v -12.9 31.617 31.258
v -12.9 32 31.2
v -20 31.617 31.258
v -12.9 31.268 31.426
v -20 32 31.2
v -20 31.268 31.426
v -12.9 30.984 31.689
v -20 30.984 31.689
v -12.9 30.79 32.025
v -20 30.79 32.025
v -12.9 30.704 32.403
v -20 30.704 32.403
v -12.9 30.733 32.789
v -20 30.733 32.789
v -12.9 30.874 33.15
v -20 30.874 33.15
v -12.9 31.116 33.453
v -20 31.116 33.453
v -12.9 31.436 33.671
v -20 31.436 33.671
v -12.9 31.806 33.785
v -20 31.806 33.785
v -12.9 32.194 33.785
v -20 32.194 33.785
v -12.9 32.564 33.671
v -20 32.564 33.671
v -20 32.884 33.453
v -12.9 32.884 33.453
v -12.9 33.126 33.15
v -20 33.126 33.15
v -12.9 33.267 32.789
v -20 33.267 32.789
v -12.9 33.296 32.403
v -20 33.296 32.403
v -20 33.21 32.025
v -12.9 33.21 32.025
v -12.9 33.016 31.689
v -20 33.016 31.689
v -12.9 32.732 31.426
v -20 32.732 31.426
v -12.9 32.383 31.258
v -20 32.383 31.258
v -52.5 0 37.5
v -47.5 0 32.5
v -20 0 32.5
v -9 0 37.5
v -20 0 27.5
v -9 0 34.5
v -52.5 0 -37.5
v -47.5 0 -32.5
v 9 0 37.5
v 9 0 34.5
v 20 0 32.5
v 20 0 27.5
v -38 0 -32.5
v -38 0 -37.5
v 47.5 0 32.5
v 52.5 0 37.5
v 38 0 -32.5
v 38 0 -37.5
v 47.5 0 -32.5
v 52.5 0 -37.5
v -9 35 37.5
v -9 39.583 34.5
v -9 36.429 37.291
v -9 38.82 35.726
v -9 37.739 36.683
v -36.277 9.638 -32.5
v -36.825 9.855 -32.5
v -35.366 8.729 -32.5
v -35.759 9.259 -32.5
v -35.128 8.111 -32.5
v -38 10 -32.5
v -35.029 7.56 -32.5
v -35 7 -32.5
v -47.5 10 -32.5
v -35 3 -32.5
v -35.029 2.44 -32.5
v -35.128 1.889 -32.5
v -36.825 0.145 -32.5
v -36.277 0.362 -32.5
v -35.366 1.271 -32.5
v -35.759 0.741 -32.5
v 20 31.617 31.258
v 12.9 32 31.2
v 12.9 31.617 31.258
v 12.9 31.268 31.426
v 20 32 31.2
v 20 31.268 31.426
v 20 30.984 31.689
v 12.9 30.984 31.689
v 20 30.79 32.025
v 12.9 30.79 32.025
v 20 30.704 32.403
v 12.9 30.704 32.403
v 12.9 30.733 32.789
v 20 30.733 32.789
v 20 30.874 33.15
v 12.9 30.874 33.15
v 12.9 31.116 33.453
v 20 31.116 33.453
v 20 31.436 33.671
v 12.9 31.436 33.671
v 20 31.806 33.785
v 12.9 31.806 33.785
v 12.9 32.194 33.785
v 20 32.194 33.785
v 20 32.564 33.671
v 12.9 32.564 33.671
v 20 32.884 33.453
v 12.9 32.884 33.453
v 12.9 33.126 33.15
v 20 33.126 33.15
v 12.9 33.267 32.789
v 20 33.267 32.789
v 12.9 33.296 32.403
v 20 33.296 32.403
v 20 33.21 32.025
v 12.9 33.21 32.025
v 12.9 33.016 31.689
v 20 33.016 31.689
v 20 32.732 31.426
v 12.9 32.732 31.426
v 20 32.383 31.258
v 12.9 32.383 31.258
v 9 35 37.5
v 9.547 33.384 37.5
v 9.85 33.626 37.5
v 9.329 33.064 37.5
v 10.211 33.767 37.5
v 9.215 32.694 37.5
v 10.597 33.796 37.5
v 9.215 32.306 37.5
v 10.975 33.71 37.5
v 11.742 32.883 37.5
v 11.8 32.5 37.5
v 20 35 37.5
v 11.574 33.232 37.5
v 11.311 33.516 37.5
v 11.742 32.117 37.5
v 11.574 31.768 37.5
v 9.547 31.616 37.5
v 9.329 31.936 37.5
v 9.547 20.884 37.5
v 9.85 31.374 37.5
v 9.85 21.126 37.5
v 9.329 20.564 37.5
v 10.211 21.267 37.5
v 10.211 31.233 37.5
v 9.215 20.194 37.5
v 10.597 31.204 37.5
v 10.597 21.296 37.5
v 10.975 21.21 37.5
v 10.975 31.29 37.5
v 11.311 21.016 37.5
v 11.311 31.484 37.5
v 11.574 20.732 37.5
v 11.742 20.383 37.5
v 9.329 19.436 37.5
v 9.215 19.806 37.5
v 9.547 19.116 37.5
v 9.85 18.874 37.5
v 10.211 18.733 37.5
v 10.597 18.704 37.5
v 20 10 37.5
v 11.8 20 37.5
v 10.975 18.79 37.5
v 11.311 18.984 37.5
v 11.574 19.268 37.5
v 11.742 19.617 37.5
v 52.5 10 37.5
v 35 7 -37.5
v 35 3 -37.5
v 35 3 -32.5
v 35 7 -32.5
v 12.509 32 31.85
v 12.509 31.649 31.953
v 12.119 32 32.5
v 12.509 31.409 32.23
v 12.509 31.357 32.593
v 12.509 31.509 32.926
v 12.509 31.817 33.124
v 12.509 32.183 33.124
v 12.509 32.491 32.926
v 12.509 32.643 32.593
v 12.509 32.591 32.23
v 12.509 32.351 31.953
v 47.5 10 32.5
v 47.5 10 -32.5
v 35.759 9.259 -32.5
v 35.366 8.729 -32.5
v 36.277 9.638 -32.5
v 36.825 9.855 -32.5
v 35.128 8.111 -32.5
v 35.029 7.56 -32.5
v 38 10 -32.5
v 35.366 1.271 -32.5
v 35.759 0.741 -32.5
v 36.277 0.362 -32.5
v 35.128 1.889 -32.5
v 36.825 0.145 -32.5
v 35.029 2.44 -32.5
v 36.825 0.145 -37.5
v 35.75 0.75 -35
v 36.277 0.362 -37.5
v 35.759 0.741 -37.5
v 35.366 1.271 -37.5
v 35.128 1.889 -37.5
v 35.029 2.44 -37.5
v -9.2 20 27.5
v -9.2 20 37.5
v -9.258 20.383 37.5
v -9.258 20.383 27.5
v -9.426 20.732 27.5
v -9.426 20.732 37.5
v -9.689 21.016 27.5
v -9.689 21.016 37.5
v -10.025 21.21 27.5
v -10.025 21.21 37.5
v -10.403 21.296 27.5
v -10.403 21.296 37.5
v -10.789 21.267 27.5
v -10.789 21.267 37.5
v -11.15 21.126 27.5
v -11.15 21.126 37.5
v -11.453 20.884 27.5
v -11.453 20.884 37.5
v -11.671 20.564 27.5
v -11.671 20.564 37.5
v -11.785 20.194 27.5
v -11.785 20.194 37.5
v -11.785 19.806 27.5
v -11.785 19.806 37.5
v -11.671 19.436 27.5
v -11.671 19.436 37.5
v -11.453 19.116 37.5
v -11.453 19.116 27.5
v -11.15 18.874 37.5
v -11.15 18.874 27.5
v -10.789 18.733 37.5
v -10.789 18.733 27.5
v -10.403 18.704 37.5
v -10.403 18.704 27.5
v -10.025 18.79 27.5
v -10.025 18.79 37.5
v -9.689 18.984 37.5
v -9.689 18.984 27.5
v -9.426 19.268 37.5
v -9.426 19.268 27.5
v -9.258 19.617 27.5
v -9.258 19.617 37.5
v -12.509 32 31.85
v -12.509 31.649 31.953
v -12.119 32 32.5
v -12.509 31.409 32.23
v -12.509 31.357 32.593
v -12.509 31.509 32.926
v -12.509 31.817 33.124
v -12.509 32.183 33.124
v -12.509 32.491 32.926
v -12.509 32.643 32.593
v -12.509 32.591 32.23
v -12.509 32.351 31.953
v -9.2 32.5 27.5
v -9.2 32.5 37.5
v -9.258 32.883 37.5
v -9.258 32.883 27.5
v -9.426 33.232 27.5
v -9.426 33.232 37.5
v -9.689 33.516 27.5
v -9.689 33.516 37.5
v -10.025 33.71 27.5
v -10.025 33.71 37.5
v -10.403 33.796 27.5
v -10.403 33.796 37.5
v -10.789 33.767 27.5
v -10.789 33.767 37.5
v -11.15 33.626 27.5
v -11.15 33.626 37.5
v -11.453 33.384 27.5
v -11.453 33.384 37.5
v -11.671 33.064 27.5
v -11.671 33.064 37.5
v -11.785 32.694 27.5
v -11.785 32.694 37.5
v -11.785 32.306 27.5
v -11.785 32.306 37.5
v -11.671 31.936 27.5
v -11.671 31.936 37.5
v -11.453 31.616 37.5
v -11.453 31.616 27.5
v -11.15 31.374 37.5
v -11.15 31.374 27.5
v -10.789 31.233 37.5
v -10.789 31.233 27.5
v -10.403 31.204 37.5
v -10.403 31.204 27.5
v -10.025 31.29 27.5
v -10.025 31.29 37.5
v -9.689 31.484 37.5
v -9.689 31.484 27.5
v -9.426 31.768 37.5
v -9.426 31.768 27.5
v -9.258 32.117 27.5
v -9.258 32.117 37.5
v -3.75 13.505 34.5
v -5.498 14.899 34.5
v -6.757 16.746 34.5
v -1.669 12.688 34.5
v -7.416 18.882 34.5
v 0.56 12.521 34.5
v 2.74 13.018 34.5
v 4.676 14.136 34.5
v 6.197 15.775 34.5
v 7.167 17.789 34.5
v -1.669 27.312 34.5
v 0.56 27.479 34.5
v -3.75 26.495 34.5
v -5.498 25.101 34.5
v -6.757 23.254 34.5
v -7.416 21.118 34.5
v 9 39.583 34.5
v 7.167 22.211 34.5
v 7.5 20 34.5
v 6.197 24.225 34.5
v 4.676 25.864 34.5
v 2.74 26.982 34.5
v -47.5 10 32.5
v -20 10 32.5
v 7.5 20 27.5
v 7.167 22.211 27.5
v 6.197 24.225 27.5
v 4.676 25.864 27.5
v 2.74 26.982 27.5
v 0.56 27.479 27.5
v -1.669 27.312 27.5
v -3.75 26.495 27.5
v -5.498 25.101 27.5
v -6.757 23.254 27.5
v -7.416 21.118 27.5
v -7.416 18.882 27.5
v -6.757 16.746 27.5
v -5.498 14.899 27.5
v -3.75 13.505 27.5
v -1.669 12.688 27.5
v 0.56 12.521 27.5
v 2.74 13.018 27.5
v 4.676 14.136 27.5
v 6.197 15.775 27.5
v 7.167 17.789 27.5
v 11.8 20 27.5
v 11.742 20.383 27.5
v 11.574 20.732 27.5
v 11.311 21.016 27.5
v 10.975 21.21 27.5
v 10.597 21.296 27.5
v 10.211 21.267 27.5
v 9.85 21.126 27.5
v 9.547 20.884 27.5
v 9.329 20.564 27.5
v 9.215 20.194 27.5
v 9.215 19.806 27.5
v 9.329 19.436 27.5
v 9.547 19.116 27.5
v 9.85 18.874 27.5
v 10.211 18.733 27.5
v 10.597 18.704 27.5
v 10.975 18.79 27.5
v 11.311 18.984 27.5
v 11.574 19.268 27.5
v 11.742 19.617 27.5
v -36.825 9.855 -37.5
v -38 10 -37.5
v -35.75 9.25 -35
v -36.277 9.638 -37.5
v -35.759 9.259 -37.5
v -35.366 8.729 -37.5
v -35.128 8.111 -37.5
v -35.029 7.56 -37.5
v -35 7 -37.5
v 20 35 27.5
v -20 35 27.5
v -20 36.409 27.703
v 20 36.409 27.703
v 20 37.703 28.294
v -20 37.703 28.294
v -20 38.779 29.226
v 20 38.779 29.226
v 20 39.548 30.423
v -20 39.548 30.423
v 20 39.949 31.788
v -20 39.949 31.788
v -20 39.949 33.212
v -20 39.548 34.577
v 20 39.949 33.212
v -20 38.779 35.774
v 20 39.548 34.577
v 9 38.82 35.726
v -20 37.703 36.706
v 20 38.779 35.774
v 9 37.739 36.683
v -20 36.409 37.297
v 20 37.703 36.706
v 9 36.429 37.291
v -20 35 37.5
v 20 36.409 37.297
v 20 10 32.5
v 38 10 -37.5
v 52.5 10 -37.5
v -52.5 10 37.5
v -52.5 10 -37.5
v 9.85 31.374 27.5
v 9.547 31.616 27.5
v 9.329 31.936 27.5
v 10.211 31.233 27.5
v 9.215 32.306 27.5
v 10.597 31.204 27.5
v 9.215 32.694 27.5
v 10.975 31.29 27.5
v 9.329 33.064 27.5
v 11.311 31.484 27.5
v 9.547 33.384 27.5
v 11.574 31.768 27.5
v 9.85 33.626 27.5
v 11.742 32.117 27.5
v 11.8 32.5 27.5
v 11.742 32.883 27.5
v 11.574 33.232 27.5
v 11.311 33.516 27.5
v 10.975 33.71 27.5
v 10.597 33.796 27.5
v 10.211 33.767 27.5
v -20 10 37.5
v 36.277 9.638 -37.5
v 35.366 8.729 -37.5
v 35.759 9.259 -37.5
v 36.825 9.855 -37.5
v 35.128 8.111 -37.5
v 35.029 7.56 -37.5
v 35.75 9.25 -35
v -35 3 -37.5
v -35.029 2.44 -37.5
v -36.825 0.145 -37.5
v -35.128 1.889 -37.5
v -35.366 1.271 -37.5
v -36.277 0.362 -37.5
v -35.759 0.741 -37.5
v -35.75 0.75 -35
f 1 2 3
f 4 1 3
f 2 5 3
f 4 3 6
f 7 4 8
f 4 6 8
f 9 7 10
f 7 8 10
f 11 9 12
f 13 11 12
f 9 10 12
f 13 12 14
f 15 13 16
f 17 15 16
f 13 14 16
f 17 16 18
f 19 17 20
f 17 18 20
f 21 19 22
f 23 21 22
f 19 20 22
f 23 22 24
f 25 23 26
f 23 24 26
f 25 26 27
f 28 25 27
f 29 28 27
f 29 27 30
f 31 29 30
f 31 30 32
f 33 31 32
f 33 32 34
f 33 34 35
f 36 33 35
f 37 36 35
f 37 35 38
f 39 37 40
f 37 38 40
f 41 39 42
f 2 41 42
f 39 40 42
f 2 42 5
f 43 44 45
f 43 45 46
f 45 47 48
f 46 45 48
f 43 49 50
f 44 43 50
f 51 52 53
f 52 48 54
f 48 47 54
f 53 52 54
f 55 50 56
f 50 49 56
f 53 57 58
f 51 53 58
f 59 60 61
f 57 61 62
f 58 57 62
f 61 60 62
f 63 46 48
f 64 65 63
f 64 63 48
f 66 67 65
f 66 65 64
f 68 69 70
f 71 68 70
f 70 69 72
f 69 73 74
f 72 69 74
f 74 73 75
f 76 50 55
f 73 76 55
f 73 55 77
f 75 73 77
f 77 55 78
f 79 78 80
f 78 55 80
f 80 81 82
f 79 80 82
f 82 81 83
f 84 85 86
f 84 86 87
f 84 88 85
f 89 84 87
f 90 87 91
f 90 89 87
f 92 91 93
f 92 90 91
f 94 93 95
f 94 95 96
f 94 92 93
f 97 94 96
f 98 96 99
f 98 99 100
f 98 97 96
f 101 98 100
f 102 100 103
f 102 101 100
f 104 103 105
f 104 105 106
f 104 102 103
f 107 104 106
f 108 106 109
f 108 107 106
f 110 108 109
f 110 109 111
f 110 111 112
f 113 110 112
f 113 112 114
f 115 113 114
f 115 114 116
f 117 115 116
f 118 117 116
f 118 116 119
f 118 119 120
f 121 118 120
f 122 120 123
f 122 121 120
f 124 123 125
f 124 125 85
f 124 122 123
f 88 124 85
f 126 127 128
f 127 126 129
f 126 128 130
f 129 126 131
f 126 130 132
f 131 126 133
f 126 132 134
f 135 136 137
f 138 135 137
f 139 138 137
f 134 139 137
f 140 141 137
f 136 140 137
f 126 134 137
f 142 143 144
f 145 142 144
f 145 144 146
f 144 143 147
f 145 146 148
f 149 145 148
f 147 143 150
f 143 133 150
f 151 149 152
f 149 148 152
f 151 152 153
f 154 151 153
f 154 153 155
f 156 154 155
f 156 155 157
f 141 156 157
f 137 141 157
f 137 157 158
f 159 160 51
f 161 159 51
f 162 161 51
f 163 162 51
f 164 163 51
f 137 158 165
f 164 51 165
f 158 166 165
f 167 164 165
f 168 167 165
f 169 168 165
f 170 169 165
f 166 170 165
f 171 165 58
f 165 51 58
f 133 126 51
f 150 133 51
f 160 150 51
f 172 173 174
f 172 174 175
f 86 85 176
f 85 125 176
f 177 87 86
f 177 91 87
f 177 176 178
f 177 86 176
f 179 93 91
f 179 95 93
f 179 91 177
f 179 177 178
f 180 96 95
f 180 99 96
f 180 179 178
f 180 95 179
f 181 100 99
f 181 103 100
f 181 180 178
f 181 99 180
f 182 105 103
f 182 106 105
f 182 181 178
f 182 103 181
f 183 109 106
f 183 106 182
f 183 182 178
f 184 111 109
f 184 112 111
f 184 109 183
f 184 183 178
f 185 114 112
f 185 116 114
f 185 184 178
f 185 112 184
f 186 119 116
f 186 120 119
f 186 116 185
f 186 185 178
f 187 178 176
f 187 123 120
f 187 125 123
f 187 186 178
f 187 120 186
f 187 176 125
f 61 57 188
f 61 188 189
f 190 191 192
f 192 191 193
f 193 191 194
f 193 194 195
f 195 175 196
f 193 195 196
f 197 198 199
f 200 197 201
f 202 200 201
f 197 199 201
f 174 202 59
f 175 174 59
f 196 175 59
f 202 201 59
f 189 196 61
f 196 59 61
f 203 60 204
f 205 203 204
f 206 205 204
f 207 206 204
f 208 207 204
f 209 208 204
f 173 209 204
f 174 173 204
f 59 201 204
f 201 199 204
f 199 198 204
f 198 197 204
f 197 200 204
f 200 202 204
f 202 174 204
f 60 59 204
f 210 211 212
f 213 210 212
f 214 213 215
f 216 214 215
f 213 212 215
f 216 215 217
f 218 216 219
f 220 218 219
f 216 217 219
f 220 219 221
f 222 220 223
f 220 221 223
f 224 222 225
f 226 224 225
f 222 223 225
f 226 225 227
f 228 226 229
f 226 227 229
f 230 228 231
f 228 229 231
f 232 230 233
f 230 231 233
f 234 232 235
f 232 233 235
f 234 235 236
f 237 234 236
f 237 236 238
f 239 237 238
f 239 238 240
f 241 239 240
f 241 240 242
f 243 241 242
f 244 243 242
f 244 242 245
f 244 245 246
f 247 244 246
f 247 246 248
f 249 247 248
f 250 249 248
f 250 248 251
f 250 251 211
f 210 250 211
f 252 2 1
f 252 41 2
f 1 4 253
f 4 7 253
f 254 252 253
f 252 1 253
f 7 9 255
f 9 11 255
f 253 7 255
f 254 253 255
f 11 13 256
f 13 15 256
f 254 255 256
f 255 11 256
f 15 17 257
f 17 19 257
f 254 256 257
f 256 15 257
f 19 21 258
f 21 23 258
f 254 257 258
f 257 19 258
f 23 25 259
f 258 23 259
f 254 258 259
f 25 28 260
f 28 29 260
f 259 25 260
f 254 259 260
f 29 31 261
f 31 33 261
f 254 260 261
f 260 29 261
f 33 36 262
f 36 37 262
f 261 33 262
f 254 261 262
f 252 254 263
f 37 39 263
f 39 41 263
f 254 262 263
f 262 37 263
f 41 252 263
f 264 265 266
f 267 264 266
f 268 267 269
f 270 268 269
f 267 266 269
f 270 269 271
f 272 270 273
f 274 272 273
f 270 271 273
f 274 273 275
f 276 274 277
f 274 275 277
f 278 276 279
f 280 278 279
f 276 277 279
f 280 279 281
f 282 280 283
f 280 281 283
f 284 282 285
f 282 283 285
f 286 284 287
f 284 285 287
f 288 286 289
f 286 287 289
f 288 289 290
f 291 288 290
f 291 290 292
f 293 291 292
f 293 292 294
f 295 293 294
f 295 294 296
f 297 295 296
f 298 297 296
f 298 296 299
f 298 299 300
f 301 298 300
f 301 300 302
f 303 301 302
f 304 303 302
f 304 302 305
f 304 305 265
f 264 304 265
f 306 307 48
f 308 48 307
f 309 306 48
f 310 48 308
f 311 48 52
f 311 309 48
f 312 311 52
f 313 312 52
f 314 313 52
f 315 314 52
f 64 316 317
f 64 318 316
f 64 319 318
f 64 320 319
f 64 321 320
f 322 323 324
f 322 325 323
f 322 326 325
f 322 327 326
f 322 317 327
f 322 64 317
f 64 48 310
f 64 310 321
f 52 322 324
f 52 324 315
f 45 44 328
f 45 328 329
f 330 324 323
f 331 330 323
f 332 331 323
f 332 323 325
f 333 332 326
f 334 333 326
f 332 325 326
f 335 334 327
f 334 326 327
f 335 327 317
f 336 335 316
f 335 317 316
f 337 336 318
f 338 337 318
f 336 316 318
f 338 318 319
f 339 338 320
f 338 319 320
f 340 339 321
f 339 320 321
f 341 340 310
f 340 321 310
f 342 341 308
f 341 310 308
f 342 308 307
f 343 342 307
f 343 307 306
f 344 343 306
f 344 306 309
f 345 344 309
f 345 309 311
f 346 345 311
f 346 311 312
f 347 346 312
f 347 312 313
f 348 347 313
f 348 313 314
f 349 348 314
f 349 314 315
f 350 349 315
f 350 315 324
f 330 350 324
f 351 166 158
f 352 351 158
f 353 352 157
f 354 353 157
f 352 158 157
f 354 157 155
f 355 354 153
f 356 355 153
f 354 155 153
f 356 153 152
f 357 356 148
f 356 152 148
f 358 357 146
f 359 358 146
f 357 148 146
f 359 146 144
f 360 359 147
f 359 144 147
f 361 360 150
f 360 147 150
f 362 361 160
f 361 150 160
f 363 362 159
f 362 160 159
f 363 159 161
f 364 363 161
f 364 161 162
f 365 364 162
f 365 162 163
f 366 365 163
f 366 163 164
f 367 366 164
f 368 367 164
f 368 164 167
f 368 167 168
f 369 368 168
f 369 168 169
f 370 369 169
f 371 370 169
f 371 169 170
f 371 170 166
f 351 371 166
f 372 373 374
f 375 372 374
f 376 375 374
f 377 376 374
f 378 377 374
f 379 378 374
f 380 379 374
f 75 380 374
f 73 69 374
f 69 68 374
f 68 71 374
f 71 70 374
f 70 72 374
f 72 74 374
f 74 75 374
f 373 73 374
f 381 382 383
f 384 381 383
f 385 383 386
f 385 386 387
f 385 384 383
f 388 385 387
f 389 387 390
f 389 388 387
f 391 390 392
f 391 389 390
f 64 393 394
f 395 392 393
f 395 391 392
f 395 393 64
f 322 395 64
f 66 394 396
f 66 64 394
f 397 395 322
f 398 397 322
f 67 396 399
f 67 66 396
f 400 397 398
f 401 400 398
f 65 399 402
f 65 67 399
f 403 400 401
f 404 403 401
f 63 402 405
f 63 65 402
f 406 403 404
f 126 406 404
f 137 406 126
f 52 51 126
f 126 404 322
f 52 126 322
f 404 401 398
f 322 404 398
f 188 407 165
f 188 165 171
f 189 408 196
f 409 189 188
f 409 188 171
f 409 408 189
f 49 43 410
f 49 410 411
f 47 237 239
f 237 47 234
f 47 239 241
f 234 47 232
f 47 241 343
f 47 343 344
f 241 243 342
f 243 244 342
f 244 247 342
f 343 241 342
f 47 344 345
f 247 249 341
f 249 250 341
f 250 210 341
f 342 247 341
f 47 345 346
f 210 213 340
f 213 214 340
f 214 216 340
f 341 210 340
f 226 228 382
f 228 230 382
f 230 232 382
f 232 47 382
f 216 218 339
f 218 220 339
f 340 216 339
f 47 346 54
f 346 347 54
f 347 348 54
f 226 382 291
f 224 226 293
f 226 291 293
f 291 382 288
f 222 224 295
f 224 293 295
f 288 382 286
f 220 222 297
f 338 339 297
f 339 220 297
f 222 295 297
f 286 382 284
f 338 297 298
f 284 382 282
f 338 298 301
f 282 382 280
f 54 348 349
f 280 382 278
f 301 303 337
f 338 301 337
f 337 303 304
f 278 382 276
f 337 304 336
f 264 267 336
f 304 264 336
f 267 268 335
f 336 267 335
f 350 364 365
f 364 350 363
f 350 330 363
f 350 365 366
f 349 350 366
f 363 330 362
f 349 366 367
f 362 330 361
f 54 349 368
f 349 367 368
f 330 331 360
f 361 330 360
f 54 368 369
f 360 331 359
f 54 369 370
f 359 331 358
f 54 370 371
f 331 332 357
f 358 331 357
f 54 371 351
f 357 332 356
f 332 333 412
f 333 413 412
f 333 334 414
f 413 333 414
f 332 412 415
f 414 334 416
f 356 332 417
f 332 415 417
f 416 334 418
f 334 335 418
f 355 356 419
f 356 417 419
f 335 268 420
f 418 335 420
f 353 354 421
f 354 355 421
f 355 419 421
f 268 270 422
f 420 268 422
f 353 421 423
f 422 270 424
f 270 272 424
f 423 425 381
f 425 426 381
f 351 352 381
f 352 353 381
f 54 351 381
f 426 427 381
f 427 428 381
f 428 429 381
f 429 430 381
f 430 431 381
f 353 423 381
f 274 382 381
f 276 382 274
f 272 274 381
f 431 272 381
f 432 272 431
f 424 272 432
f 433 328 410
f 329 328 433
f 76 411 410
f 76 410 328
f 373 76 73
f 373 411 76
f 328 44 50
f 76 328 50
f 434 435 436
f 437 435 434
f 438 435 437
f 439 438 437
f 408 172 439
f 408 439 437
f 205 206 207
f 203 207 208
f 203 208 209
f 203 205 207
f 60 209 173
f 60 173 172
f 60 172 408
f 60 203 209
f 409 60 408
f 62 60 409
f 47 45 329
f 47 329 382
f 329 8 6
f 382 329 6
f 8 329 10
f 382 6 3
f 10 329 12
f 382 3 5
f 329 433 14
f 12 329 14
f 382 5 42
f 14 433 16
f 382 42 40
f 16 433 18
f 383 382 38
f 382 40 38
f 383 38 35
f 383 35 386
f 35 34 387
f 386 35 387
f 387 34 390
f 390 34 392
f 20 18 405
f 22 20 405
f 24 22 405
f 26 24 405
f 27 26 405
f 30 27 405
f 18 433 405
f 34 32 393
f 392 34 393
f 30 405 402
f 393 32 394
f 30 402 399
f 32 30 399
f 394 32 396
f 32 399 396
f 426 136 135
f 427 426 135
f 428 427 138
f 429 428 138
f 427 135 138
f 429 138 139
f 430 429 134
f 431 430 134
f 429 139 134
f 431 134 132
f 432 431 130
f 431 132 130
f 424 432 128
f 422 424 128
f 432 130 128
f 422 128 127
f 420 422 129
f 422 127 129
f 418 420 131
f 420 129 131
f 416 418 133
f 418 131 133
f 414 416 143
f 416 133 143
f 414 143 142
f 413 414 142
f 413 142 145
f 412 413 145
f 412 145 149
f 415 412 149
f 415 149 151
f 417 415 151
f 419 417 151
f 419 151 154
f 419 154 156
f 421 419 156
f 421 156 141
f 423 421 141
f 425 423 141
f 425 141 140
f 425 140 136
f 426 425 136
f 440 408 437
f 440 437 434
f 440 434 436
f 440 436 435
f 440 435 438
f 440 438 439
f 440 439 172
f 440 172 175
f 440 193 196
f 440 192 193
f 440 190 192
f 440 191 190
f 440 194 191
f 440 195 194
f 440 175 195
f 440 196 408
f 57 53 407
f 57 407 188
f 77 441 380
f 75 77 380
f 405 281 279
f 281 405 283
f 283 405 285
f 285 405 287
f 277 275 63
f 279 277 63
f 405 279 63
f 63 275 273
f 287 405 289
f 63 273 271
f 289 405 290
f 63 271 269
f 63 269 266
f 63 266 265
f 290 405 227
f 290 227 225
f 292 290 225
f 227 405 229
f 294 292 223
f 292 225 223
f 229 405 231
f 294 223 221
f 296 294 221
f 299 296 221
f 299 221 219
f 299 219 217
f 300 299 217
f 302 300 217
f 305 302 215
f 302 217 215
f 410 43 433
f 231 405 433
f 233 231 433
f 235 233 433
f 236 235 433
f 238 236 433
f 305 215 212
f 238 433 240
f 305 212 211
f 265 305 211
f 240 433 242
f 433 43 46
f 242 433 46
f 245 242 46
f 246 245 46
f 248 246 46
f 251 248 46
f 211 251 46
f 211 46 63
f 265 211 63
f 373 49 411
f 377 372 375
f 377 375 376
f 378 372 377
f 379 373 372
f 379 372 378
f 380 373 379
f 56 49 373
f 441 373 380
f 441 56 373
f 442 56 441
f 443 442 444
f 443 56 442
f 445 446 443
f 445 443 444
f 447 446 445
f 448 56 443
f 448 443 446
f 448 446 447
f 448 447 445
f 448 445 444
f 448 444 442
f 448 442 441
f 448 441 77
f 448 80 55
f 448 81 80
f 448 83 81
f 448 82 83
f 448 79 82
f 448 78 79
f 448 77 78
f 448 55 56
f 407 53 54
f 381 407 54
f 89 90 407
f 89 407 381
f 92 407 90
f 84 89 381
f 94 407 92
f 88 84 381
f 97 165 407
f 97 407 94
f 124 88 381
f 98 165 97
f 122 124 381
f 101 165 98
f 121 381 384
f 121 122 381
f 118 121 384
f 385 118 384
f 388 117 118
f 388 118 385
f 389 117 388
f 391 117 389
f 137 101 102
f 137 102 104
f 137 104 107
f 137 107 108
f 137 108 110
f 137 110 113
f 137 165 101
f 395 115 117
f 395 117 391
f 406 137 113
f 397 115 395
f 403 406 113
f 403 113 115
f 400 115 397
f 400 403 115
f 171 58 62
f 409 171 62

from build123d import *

# Parameters (mm, degrees)
SKETCH_1_W          = 105
SKETCH_1_H          = 75
SKETCH_1_W_2        = 95
SKETCH_1_H_2        = 65
EXTRUDE_1_DEPTH     = 10
SKETCH_2_W          = 40
SKETCH_2_H          = 40
EXTRUDE_2_DEPTH     = 10
CUT_EXTRUDE_1_REACH = 101.906
SKETCH_3_R          = 7.5
CUT_EXTRUDE_2_REACH = 101.906
SKETCH_4_W          = 70
SKETCH_4_H          = 10
FILLET_2_RADIUS     = 5
FILLET_2_LENGTH     = 40
FILLET_3_SIZE       = 3
SKETCH_8_R          = 1.3
CUT_EXTRUDE_3_DEPTH = 100.906206141
SKETCH_9_W          = 18
SKETCH_9_H          = 50
CUT_EXTRUDE_4_DEPTH = 3


with BuildPart() as part:
    # 草圖1 → 填料-伸長1 (new body)
    with BuildSketch(Plane(origin=(0, 0, 0), x_dir=(1, 0, 0), z_dir=(0, 1, 0))):
        Rectangle(SKETCH_1_W, SKETCH_1_H)
        Rectangle(SKETCH_1_W_2, SKETCH_1_H_2, mode=Mode.SUBTRACT)
    extrude(amount=EXTRUDE_1_DEPTH)

    # 草圖2 → 填料-伸長2 (add)
    with BuildSketch(Plane.XY.offset(37.5)):
        with Locations((0, 20)):
            Rectangle(SKETCH_2_W, SKETCH_2_H)
    extrude(amount=-EXTRUDE_2_DEPTH)

    # 草圖3 → 除料-伸長1 (cut, up to next)
    with BuildSketch(Plane.XY.offset(37.5), mode=Mode.PRIVATE) as cut_extrude_1_sk1:
        with Locations((0, 20)):
            Circle(SKETCH_3_R)
    cut_extrude_1_tool1 = extrude(cut_extrude_1_sk1.sketch, amount=-CUT_EXTRUDE_1_REACH, mode=Mode.PRIVATE) & part.part
    add(cut_extrude_1_tool1.solids().sort_by_distance((0, 20, 37.5))[0], mode=Mode.SUBTRACT)

    # 草圖4 → 除料-伸長2 (cut, up to next)
    with BuildSketch(Plane(origin=(0, 0, -37.5), x_dir=(-1, 0, 0), z_dir=(0, 0, -1)), mode=Mode.PRIVATE) as cut_extrude_2_sk1:
        with Locations((0, 5)):
            Rectangle(SKETCH_4_W, SKETCH_4_H)
    cut_extrude_2_tool1 = extrude(cut_extrude_2_sk1.sketch, amount=-CUT_EXTRUDE_2_REACH, mode=Mode.PRIVATE) & part.part
    add(cut_extrude_2_tool1.solids().sort_by_distance((0, 5, -37.5))[0], mode=Mode.SUBTRACT)

    # 草圖7 → Ø1.0 (1) 直徑孔1 (revolve, cut)
    with BuildSketch(Plane(origin=(20, 32, 32.5), x_dir=(0, 0, -1), z_dir=(0, 1, 0))):
        Polygon((0, 0), (0, 7.881118805), (1.3, 7.1), (1.3, 0), align=None)
    hole_wizard_1_0_1_1 = revolve(axis=Axis((26.35, 32, 32.5), (-1, 0, 0)), mode=Mode.SUBTRACT)

    # 鏡射1: Ø1.0 (1) 直徑孔1 across plane
    add(hole_wizard_1_0_1_1.mirror(Plane(origin=(0, 0, 0), x_dir=(0, 0, 1), z_dir=(1, 0, 0))), mode=Mode.SUBTRACT)

    # 圓角2: full round fillet: the end face becomes a half cylinder, R = half its width
    fillet_2_face = Plane((0, 40, 32.5), x_dir=(1, 0, 0), z_dir=(0, 1, 0))  # on the end face: x along it, z out of the body
    fillet_2_slab = fillet_2_face.offset(-FILLET_2_RADIUS / 2) * Box(FILLET_2_LENGTH, 2 * FILLET_2_RADIUS, FILLET_2_RADIUS, mode=Mode.PRIVATE)  # the body's end, R deep
    fillet_2_round = Plane((0, 35, 32.5), x_dir=(0, 1, 0), z_dir=(1, 0, 0)) * Cylinder(FILLET_2_RADIUS, FILLET_2_LENGTH, mode=Mode.PRIVATE)  # its axis R under the face
    add(fillet_2_slab - fillet_2_round, mode=Mode.SUBTRACT)

    # 圓角3
    # a fillet whose section is not a circle: 3 mm, written as the material it takes off along each edge
    with BuildSketch(Plane(origin=(35, 0, -45), x_dir=(0, 1, 0), z_dir=(0, 0, 1)), Plane(origin=(-35, 10, -45), x_dir=(0, -1, 0), z_dir=(0, 0, 1))) as fillet_3_piece_1:
        with BuildLine():
            Bezier((FILLET_3_SIZE, 0), (0, 0), (0, -FILLET_3_SIZE), weights=[1, 1, 1])
            Line((0, -FILLET_3_SIZE), (0, 0))
            Line((0, 0), (FILLET_3_SIZE, 0))
        make_face()
    extrude(amount=20, mode=Mode.SUBTRACT)
    with BuildSketch(Plane(origin=(35, 10, -45), x_dir=(0, -1, 0), z_dir=(0, 0, 1)), Plane(origin=(-35, 0, -45), x_dir=(0, 1, 0), z_dir=(0, 0, 1))) as fillet_3_piece_2:
        with BuildLine():
            Bezier((FILLET_3_SIZE, 0), (0, 0), (0, FILLET_3_SIZE), weights=[1, 1, 1])
            Line((0, FILLET_3_SIZE), (0, 0))
            Line((0, 0), (FILLET_3_SIZE, 0))
        make_face()
    extrude(amount=20, mode=Mode.SUBTRACT)

    # 草圖8 → 除料-伸長3 (cut, through all)
    with BuildSketch(Plane.XY.offset(37.5)):
        with Locations((-10.5, 32.5)):
            Circle(SKETCH_8_R)
        with Locations((-10.5, 20)):
            Circle(SKETCH_8_R)
        with Locations((10.5, 32.5)):
            Circle(SKETCH_8_R)
        with Locations((10.5, 20)):
            Circle(SKETCH_8_R)
    extrude(amount=-CUT_EXTRUDE_3_DEPTH, mode=Mode.SUBTRACT)

    # 草圖9 → 除料-伸長4 (cut)
    with BuildSketch(Plane.XY.offset(37.5)):
        with Locations((0, 20)):
            Rectangle(SKETCH_9_W, SKETCH_9_H)
    extrude(amount=-CUT_EXTRUDE_4_DEPTH, mode=Mode.SUBTRACT)


solid = part.part
